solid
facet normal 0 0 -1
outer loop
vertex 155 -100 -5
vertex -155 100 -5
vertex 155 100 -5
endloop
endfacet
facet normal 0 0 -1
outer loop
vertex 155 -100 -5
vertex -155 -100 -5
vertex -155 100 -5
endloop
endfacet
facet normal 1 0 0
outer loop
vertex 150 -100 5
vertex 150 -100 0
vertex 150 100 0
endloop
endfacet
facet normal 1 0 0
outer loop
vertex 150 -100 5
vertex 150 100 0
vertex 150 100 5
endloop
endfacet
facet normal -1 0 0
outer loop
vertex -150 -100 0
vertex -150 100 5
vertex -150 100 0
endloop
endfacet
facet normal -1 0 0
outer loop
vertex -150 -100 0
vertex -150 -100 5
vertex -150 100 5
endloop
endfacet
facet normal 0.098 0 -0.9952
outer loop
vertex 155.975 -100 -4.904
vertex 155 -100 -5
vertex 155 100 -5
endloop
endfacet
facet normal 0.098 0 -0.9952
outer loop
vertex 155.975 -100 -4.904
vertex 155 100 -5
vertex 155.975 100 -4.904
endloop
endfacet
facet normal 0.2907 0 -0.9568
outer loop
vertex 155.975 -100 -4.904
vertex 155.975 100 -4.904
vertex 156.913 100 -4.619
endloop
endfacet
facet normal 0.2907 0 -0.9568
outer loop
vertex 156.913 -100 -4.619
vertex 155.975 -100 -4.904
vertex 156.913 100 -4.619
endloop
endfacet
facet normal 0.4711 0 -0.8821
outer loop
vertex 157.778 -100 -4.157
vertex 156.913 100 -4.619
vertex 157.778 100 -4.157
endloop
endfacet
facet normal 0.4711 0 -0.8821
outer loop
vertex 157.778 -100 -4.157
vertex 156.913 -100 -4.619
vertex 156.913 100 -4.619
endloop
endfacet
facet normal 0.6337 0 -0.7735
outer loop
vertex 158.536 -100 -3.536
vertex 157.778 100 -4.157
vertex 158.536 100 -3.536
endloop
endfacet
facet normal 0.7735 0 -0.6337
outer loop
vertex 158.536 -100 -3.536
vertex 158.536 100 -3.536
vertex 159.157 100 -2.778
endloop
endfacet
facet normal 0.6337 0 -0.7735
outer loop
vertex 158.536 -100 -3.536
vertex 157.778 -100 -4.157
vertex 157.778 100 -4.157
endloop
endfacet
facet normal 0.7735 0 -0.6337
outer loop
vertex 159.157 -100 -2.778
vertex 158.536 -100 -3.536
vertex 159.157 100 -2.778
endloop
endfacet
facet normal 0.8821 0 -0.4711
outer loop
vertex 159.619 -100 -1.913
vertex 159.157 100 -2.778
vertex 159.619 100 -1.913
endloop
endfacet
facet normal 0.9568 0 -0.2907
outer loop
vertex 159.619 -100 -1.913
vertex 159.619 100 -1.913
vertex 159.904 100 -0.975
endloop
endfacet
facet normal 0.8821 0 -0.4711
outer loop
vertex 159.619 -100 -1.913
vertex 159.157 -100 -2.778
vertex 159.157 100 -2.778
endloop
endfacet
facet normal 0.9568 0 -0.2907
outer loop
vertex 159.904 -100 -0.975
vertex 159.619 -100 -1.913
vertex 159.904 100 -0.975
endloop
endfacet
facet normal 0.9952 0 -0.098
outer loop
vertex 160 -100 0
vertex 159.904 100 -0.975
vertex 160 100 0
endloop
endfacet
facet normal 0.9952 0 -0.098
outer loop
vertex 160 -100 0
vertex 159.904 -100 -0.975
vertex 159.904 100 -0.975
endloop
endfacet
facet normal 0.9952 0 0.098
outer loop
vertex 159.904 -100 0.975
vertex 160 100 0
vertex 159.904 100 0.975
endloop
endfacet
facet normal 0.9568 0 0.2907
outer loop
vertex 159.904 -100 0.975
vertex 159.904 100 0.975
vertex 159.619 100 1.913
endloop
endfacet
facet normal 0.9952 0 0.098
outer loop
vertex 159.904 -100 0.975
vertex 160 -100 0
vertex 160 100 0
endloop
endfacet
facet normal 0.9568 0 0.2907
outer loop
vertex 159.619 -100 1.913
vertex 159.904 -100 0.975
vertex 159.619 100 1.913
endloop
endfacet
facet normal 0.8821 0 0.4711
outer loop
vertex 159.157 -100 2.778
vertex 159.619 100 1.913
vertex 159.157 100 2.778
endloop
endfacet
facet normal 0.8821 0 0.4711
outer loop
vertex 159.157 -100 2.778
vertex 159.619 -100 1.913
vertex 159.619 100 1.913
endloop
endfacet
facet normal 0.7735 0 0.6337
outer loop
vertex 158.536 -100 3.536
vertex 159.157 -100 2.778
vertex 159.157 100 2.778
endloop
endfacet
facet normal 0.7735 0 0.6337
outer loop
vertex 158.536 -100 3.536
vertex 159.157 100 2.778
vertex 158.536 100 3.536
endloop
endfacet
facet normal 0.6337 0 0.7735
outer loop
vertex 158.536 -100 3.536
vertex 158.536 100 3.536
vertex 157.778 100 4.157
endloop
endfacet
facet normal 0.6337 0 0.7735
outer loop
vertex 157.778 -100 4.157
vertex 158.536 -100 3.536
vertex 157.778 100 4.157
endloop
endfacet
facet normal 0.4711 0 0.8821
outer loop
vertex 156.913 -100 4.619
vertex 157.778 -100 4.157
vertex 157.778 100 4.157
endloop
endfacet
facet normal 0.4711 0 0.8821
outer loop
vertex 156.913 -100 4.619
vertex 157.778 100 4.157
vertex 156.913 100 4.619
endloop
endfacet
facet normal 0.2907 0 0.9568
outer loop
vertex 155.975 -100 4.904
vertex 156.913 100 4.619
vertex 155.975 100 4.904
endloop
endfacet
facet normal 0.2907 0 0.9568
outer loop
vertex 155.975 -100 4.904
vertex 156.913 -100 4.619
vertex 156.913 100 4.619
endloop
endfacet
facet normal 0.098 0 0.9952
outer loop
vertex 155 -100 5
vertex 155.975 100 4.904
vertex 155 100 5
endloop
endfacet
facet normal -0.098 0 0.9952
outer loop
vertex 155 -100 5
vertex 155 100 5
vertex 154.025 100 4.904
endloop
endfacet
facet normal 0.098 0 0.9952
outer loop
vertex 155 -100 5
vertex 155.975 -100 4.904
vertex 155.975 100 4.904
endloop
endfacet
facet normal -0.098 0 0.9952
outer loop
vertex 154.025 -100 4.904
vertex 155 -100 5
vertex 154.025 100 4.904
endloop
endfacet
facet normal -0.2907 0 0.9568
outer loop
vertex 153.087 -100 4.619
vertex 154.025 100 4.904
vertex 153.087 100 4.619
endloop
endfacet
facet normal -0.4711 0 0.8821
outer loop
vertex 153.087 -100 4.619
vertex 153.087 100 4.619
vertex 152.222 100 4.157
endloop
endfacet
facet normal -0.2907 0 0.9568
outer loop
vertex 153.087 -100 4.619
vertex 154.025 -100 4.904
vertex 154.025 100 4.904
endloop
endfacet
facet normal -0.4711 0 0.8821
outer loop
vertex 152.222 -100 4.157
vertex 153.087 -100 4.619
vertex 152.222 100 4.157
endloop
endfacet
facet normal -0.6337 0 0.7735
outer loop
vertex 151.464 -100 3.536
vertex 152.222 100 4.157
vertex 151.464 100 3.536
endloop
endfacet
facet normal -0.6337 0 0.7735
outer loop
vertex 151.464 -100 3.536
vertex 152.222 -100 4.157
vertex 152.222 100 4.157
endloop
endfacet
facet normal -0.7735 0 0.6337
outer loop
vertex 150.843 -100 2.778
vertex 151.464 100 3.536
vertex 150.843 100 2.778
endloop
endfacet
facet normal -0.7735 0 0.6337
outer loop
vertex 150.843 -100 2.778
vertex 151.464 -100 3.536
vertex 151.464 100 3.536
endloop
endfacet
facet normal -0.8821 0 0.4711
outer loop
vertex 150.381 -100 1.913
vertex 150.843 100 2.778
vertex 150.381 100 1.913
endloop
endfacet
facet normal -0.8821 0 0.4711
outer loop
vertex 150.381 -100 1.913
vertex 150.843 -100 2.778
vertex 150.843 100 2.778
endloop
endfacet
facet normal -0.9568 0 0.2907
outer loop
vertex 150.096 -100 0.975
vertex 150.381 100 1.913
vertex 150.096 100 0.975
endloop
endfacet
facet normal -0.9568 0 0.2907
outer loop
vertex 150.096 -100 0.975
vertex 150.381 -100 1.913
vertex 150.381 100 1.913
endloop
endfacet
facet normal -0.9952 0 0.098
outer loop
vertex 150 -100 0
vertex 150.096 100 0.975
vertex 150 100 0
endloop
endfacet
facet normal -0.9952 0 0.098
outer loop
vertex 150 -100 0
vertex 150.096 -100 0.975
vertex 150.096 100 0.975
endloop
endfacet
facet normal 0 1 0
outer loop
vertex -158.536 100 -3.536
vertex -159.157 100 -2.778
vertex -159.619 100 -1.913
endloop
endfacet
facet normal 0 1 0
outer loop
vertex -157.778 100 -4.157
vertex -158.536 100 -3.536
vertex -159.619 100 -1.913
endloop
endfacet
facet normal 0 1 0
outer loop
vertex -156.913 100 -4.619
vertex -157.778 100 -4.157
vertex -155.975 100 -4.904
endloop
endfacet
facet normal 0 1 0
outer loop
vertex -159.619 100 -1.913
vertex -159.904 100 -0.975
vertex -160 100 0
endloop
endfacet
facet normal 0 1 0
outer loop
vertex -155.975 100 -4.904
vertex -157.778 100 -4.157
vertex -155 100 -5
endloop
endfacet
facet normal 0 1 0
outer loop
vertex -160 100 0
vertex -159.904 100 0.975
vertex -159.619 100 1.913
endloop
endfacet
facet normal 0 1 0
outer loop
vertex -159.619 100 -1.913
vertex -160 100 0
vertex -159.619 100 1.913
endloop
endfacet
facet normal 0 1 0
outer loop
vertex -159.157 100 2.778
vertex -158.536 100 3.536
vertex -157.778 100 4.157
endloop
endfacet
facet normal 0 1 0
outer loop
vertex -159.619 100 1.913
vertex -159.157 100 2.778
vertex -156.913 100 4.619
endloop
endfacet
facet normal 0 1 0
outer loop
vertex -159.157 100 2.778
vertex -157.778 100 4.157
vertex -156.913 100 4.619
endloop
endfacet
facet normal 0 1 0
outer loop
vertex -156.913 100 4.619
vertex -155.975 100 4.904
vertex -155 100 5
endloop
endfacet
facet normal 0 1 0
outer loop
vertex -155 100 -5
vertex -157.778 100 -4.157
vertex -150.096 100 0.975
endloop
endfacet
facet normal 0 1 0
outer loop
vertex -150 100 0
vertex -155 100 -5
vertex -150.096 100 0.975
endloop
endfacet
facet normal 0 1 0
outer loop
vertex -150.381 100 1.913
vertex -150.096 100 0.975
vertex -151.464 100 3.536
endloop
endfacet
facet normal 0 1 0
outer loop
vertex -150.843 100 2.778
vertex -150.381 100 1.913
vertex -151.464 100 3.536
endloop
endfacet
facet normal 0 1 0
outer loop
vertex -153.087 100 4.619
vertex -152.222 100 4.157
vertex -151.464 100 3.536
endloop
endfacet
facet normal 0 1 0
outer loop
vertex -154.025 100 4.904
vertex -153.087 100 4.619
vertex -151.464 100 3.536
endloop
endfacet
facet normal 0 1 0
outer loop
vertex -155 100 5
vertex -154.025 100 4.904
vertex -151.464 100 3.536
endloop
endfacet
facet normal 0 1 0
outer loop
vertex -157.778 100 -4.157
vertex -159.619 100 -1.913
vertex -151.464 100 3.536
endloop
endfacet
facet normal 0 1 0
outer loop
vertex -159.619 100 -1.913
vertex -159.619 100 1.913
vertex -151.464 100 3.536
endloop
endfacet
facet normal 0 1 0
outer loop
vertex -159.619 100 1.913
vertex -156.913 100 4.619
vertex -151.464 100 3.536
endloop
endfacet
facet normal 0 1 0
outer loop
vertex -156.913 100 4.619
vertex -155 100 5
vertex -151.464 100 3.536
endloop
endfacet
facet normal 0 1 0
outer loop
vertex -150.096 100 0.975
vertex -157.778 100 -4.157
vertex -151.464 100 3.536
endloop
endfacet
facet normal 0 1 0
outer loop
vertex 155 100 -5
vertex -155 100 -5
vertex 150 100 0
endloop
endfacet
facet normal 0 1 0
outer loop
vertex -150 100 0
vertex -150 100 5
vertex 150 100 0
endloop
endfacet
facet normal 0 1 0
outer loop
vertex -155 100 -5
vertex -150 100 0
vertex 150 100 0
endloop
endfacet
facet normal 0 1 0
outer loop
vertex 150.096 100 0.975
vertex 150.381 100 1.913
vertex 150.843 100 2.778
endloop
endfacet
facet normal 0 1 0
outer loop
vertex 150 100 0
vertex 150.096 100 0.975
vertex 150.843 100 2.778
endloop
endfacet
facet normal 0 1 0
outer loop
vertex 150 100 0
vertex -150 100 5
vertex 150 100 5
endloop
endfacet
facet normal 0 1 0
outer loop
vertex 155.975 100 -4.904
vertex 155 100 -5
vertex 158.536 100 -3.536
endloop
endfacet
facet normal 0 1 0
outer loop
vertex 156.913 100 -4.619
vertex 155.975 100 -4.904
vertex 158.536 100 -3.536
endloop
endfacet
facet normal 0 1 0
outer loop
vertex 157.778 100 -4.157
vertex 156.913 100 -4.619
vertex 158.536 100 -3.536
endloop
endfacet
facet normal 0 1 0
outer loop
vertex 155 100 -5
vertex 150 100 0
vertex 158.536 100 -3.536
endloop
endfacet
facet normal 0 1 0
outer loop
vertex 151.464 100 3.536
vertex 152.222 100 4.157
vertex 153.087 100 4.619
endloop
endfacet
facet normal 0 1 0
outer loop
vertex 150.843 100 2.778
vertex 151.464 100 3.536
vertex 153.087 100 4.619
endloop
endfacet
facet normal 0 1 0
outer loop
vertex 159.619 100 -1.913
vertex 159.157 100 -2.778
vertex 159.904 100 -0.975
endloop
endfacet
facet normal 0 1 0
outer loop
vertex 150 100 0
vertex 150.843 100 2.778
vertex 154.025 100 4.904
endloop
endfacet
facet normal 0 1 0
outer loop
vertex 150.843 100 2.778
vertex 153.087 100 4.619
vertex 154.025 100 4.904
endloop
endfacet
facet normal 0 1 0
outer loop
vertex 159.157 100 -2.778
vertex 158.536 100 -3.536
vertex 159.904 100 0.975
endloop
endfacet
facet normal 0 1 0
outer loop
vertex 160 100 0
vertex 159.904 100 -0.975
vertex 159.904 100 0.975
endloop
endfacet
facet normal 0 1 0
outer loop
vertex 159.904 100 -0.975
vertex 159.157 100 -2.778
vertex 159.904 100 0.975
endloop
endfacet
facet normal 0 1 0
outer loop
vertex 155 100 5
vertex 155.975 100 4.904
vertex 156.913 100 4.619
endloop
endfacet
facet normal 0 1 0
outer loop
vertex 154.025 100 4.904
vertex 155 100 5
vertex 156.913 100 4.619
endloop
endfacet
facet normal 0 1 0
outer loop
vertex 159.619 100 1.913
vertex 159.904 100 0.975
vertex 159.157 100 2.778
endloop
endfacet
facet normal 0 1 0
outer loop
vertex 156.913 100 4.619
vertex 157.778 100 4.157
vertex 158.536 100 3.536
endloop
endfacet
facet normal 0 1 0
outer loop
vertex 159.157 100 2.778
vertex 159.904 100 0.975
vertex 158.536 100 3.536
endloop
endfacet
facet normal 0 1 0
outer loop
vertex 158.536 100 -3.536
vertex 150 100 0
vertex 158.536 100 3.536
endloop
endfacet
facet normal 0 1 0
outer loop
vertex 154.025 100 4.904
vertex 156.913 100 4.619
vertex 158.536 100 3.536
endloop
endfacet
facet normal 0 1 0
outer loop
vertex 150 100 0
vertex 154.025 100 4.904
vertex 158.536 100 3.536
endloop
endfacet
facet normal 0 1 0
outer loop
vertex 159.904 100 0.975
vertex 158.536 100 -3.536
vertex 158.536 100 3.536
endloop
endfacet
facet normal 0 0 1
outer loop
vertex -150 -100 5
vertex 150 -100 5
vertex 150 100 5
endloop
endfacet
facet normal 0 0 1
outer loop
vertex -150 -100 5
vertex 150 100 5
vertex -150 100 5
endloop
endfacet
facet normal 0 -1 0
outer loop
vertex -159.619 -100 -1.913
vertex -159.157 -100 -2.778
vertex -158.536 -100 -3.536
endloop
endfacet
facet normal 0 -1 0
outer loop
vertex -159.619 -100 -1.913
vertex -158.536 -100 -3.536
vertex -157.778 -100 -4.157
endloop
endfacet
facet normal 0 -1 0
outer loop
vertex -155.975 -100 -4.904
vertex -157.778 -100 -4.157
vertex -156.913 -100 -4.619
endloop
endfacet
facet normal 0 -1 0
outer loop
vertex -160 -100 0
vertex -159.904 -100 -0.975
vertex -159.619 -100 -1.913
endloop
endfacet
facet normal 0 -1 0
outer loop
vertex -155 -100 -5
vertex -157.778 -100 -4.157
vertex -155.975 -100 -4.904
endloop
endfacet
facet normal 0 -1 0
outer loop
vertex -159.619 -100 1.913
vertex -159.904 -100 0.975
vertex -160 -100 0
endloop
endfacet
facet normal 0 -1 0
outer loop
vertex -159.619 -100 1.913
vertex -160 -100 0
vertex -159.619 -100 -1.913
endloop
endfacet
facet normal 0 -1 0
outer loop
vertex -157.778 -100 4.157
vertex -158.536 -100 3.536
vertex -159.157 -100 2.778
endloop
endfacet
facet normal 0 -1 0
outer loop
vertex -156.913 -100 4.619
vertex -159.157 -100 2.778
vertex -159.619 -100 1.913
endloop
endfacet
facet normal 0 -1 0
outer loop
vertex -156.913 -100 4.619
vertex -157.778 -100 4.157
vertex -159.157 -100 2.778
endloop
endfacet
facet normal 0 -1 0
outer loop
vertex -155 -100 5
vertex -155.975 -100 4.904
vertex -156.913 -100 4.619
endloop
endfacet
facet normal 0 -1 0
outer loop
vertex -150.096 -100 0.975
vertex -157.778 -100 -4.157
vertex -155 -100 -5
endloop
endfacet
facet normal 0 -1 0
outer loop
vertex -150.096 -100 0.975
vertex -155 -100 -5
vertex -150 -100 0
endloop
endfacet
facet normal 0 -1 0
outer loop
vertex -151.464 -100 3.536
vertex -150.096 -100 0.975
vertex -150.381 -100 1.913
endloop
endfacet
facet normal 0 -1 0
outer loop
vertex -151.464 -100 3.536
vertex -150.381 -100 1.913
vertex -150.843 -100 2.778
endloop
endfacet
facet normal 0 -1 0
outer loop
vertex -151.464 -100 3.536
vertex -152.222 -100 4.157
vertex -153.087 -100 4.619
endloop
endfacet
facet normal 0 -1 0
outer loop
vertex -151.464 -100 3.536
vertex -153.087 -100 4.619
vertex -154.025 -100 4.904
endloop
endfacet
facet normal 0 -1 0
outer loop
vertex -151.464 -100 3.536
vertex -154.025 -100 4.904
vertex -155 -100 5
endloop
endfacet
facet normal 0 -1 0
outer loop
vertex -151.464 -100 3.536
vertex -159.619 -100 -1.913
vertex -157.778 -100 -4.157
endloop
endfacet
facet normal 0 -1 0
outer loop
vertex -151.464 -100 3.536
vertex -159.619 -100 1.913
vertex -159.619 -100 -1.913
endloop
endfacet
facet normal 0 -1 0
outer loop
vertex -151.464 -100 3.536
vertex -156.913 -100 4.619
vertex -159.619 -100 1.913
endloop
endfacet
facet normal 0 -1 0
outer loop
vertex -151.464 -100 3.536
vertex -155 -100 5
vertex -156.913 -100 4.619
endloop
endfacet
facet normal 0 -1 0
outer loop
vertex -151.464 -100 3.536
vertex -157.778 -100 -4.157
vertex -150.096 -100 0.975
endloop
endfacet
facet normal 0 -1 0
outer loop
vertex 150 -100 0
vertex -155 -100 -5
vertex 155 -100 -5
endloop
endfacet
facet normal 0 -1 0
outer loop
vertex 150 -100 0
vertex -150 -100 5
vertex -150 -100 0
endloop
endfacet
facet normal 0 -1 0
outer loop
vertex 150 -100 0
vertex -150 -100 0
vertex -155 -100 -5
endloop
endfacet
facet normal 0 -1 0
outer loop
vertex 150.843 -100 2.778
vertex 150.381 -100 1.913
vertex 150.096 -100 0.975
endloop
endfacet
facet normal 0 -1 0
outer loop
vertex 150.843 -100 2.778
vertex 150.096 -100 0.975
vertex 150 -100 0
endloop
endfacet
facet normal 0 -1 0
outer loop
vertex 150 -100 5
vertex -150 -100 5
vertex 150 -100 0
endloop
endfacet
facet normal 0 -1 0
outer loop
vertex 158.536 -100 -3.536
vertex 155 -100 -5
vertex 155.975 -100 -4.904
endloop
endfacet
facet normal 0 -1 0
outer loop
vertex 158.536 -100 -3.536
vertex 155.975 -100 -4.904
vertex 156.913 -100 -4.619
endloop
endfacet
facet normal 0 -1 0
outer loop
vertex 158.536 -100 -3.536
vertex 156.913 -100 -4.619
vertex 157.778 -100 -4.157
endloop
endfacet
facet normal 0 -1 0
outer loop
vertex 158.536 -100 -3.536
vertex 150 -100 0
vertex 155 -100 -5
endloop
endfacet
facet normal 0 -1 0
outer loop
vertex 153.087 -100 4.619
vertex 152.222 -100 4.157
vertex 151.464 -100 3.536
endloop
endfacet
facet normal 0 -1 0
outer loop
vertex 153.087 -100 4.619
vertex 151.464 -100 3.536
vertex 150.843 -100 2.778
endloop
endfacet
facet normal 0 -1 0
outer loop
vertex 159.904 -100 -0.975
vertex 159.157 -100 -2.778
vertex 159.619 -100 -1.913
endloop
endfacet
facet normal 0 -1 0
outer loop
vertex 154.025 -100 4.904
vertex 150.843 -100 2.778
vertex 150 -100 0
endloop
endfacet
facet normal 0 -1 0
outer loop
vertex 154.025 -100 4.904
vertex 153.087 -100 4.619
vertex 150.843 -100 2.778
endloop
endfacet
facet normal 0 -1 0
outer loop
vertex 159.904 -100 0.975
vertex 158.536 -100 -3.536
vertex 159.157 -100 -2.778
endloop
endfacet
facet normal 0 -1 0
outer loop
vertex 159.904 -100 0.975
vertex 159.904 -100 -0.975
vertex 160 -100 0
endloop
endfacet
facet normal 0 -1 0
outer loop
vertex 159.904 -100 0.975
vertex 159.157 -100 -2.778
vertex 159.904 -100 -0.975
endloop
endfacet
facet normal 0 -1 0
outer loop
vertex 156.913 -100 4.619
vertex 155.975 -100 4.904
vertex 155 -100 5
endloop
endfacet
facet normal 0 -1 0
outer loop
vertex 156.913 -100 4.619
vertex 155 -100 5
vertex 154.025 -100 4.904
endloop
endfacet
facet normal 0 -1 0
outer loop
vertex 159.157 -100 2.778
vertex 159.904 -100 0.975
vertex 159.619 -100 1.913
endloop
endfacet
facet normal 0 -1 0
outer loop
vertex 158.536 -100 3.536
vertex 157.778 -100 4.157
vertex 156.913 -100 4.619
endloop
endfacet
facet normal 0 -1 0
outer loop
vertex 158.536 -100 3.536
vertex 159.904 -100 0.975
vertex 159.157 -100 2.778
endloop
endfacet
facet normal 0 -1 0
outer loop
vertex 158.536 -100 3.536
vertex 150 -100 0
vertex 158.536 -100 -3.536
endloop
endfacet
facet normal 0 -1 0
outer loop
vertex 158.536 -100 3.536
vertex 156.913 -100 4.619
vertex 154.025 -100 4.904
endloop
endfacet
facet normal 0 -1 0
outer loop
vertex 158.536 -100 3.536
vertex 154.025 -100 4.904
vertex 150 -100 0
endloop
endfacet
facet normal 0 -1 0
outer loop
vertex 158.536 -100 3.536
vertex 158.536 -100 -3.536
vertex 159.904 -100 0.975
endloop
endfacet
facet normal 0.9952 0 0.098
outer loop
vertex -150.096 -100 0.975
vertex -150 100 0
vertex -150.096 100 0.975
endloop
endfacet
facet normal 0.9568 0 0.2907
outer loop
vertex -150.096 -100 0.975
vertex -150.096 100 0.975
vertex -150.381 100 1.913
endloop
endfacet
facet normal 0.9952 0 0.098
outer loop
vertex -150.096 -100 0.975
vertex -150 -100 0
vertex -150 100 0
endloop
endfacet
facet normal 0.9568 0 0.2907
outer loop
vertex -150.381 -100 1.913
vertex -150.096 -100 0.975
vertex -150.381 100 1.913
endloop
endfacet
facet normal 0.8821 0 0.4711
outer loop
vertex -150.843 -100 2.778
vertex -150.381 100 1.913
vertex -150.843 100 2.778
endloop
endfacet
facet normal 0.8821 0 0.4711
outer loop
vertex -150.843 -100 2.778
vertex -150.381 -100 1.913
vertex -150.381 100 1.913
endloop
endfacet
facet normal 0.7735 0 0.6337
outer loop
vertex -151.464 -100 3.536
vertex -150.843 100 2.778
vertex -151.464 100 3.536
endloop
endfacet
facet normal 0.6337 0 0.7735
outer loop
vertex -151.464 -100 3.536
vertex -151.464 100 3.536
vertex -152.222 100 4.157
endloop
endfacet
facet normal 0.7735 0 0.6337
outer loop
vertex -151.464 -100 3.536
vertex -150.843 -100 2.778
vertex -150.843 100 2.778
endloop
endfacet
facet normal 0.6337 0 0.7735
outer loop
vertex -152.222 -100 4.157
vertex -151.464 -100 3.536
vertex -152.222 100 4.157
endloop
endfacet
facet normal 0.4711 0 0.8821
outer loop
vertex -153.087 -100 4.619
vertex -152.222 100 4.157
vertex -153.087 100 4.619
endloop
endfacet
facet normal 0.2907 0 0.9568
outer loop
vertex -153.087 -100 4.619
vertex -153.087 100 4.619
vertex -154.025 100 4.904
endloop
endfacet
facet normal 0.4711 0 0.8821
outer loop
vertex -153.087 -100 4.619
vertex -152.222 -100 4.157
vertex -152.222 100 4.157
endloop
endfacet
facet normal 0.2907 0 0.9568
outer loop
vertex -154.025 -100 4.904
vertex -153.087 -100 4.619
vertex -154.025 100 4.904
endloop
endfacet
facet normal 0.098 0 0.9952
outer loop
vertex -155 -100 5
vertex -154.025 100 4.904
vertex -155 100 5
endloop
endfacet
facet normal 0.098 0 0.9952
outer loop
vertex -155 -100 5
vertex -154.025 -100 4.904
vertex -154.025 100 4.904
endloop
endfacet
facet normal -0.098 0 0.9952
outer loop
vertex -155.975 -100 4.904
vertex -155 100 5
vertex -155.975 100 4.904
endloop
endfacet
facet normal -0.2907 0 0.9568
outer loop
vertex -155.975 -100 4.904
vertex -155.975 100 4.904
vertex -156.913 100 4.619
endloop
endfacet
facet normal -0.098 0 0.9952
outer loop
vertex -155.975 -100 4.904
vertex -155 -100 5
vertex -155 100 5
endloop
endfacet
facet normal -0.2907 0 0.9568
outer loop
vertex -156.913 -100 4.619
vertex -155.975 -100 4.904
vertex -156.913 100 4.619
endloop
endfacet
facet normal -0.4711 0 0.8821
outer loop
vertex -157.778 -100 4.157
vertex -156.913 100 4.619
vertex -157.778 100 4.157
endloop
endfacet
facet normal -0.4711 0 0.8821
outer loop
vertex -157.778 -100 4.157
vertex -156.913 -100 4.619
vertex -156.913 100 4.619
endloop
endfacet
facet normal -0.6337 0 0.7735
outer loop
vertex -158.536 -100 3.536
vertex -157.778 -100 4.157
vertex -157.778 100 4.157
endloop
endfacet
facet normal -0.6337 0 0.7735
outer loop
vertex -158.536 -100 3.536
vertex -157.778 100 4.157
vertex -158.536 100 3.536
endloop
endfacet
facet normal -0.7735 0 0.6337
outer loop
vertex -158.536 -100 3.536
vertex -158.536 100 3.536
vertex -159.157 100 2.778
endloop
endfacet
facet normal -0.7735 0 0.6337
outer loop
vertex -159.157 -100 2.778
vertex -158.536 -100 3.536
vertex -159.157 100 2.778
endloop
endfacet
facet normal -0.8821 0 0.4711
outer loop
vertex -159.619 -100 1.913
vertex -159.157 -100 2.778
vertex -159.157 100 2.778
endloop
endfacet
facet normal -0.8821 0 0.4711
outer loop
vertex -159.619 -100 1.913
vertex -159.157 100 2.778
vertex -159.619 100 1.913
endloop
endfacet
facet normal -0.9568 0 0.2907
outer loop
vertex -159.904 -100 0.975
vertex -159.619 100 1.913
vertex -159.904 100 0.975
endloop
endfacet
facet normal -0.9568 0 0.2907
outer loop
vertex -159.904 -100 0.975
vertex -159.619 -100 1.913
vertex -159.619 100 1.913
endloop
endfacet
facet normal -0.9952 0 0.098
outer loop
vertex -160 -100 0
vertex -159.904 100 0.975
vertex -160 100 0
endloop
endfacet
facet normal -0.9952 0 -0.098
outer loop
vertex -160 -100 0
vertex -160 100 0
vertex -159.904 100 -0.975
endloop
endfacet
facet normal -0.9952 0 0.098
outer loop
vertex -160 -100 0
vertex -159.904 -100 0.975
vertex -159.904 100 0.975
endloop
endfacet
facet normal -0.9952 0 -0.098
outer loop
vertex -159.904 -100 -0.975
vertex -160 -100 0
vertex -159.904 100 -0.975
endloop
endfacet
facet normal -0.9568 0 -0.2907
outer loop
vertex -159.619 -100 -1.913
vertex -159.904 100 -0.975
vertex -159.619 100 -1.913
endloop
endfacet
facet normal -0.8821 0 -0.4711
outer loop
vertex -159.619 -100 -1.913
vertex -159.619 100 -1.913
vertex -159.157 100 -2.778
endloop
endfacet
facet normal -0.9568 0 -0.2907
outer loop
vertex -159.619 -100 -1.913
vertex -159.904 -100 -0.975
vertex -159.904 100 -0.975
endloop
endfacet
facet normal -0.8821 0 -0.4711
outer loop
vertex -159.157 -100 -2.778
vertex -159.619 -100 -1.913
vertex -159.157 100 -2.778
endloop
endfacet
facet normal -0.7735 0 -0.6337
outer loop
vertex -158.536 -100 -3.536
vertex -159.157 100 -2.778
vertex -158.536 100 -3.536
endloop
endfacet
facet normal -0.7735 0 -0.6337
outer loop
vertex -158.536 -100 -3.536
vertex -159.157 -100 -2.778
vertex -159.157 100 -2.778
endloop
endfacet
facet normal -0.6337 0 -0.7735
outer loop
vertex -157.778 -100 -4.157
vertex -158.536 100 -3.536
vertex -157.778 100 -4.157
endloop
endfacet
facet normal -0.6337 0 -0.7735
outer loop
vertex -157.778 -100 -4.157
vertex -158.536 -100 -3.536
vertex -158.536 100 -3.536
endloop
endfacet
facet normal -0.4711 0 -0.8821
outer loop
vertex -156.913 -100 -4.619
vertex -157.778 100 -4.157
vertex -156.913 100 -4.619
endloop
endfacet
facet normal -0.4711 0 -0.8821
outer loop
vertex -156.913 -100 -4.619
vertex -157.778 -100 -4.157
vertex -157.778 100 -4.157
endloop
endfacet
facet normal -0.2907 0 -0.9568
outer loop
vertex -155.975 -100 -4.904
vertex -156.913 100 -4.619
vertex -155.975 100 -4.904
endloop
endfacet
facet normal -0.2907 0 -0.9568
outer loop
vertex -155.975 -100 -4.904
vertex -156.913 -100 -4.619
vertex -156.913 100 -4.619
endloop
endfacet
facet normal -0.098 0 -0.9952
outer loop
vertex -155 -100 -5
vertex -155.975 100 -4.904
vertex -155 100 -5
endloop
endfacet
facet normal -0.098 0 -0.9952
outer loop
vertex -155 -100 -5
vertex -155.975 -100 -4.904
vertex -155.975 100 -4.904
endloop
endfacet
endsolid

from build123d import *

# Parameters (mm, degrees)
F1_DEPTH = 100


with BuildPart() as f1:
    # F0 (on Front) → F1 (new body, symmetric)
    with BuildSketch(Plane.XZ):
        with BuildLine():
            Line((-155, -5), (155, -5))
            ThreePointArc((155, -5), (158.535534, 3.535534), (150, 0))
            Line((150, 0), (150, 5))
            Line((150, 5), (-150, 5))
            Line((-150, 5), (-150, 0))
            ThreePointArc((-150, 0), (-158.535534, 3.535534), (-155, -5))
        make_face()
    extrude(amount=F1_DEPTH, both=True)


solid = f1.part
